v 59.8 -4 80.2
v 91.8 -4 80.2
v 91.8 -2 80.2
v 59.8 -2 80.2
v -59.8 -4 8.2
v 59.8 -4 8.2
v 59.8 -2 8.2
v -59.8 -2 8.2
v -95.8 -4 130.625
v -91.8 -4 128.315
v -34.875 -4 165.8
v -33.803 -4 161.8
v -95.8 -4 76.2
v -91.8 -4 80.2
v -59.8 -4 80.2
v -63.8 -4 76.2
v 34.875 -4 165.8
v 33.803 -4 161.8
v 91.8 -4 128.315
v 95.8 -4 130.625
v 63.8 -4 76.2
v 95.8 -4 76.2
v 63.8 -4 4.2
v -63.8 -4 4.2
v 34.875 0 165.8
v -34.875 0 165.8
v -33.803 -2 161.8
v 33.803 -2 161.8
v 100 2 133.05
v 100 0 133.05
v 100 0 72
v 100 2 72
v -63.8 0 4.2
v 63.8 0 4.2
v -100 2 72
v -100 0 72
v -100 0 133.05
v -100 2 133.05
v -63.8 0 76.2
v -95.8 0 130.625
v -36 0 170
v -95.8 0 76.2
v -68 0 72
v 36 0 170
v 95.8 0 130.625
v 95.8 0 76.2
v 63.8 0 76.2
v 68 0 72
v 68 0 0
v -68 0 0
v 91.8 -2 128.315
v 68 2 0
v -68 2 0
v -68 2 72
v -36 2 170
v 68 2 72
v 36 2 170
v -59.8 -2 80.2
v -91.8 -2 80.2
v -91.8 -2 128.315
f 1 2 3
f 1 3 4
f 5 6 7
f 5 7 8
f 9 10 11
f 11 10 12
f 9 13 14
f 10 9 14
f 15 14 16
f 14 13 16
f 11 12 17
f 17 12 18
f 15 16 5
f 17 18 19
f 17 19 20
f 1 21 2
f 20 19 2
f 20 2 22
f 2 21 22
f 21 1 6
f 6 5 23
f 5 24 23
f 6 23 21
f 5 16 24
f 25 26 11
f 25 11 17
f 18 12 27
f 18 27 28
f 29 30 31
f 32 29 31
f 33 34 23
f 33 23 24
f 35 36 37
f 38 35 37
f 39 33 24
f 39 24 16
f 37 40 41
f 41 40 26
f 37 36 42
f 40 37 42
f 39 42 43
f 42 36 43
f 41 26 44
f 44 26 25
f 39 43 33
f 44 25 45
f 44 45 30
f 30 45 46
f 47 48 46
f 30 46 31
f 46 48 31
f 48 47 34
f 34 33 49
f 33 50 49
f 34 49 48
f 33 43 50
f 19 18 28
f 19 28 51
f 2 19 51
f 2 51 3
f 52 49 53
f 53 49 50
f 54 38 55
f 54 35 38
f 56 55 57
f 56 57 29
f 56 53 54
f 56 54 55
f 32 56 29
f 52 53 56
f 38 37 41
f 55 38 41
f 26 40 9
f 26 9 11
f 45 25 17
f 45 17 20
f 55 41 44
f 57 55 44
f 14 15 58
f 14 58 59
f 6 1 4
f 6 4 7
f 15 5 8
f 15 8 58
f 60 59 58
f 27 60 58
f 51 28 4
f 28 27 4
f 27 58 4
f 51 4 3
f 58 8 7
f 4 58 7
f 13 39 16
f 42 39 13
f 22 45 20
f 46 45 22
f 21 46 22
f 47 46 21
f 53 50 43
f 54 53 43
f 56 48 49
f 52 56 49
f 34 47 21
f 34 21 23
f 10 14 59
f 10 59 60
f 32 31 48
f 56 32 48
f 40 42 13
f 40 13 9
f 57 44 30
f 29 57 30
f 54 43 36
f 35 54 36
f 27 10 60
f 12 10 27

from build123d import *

# Parameters (mm, degrees)
EXTRUDE_1_DEPTH = 2
EXTRUDE_2_DEPTH = 4
SHELL_START     = -4
SHELL_4_DEPTH   = 2


with BuildPart() as part:
    # 草图1 → 凸台-拉伸1 (new body)
    with BuildSketch(Plane(origin=(0, 0, 0), x_dir=(1, 0, 0), z_dir=(0, 1, 0))):
        Polygon((-100, -133.049582772), (-36, -170), (36, -170), (100, -133.049582772), (100, -72), (68, -72), (68, 0), (-68, 0), (-68, -72), (-100, -72), align=None)
    extrude(amount=EXTRUDE_1_DEPTH)

    # 草图2 → 凸台-拉伸2 (add)
    with BuildSketch(Plane(origin=(0, 0, 0), x_dir=(1, 0, 0), z_dir=(0, 1, 0))):
        Polygon((95.8, -76.2), (63.8, -76.2), (63.8, -4.2), (-63.8, -4.2), (-63.8, -76.2), (-95.8, -76.2), (-95.8, -130.624711641), (-34.874613392, -165.8), (34.874613392, -165.8), (95.8, -130.624711641), align=None)
    extrude(amount=-EXTRUDE_2_DEPTH)

    # 抽壳4: read off the stored shape, not the designer's step
    # 抽壳4 outline → 抽壳4 (cut)
    with BuildSketch(Plane(origin=(0, 0, 0), x_dir=(1, 0, 0), z_dir=(0, 1, 0)).offset(SHELL_START)):
        Polygon((33.802816622, -161.8), (91.8, -128.315310565), (91.8, -80.2), (59.8, -80.2), (59.8, -8.2), (-59.8, -8.2), (-59.8, -80.2), (-91.8, -80.2), (-91.8, -128.315310565), (-33.802816622, -161.8), align=None)
    extrude(amount=SHELL_4_DEPTH, mode=Mode.SUBTRACT)


solid = part.part
